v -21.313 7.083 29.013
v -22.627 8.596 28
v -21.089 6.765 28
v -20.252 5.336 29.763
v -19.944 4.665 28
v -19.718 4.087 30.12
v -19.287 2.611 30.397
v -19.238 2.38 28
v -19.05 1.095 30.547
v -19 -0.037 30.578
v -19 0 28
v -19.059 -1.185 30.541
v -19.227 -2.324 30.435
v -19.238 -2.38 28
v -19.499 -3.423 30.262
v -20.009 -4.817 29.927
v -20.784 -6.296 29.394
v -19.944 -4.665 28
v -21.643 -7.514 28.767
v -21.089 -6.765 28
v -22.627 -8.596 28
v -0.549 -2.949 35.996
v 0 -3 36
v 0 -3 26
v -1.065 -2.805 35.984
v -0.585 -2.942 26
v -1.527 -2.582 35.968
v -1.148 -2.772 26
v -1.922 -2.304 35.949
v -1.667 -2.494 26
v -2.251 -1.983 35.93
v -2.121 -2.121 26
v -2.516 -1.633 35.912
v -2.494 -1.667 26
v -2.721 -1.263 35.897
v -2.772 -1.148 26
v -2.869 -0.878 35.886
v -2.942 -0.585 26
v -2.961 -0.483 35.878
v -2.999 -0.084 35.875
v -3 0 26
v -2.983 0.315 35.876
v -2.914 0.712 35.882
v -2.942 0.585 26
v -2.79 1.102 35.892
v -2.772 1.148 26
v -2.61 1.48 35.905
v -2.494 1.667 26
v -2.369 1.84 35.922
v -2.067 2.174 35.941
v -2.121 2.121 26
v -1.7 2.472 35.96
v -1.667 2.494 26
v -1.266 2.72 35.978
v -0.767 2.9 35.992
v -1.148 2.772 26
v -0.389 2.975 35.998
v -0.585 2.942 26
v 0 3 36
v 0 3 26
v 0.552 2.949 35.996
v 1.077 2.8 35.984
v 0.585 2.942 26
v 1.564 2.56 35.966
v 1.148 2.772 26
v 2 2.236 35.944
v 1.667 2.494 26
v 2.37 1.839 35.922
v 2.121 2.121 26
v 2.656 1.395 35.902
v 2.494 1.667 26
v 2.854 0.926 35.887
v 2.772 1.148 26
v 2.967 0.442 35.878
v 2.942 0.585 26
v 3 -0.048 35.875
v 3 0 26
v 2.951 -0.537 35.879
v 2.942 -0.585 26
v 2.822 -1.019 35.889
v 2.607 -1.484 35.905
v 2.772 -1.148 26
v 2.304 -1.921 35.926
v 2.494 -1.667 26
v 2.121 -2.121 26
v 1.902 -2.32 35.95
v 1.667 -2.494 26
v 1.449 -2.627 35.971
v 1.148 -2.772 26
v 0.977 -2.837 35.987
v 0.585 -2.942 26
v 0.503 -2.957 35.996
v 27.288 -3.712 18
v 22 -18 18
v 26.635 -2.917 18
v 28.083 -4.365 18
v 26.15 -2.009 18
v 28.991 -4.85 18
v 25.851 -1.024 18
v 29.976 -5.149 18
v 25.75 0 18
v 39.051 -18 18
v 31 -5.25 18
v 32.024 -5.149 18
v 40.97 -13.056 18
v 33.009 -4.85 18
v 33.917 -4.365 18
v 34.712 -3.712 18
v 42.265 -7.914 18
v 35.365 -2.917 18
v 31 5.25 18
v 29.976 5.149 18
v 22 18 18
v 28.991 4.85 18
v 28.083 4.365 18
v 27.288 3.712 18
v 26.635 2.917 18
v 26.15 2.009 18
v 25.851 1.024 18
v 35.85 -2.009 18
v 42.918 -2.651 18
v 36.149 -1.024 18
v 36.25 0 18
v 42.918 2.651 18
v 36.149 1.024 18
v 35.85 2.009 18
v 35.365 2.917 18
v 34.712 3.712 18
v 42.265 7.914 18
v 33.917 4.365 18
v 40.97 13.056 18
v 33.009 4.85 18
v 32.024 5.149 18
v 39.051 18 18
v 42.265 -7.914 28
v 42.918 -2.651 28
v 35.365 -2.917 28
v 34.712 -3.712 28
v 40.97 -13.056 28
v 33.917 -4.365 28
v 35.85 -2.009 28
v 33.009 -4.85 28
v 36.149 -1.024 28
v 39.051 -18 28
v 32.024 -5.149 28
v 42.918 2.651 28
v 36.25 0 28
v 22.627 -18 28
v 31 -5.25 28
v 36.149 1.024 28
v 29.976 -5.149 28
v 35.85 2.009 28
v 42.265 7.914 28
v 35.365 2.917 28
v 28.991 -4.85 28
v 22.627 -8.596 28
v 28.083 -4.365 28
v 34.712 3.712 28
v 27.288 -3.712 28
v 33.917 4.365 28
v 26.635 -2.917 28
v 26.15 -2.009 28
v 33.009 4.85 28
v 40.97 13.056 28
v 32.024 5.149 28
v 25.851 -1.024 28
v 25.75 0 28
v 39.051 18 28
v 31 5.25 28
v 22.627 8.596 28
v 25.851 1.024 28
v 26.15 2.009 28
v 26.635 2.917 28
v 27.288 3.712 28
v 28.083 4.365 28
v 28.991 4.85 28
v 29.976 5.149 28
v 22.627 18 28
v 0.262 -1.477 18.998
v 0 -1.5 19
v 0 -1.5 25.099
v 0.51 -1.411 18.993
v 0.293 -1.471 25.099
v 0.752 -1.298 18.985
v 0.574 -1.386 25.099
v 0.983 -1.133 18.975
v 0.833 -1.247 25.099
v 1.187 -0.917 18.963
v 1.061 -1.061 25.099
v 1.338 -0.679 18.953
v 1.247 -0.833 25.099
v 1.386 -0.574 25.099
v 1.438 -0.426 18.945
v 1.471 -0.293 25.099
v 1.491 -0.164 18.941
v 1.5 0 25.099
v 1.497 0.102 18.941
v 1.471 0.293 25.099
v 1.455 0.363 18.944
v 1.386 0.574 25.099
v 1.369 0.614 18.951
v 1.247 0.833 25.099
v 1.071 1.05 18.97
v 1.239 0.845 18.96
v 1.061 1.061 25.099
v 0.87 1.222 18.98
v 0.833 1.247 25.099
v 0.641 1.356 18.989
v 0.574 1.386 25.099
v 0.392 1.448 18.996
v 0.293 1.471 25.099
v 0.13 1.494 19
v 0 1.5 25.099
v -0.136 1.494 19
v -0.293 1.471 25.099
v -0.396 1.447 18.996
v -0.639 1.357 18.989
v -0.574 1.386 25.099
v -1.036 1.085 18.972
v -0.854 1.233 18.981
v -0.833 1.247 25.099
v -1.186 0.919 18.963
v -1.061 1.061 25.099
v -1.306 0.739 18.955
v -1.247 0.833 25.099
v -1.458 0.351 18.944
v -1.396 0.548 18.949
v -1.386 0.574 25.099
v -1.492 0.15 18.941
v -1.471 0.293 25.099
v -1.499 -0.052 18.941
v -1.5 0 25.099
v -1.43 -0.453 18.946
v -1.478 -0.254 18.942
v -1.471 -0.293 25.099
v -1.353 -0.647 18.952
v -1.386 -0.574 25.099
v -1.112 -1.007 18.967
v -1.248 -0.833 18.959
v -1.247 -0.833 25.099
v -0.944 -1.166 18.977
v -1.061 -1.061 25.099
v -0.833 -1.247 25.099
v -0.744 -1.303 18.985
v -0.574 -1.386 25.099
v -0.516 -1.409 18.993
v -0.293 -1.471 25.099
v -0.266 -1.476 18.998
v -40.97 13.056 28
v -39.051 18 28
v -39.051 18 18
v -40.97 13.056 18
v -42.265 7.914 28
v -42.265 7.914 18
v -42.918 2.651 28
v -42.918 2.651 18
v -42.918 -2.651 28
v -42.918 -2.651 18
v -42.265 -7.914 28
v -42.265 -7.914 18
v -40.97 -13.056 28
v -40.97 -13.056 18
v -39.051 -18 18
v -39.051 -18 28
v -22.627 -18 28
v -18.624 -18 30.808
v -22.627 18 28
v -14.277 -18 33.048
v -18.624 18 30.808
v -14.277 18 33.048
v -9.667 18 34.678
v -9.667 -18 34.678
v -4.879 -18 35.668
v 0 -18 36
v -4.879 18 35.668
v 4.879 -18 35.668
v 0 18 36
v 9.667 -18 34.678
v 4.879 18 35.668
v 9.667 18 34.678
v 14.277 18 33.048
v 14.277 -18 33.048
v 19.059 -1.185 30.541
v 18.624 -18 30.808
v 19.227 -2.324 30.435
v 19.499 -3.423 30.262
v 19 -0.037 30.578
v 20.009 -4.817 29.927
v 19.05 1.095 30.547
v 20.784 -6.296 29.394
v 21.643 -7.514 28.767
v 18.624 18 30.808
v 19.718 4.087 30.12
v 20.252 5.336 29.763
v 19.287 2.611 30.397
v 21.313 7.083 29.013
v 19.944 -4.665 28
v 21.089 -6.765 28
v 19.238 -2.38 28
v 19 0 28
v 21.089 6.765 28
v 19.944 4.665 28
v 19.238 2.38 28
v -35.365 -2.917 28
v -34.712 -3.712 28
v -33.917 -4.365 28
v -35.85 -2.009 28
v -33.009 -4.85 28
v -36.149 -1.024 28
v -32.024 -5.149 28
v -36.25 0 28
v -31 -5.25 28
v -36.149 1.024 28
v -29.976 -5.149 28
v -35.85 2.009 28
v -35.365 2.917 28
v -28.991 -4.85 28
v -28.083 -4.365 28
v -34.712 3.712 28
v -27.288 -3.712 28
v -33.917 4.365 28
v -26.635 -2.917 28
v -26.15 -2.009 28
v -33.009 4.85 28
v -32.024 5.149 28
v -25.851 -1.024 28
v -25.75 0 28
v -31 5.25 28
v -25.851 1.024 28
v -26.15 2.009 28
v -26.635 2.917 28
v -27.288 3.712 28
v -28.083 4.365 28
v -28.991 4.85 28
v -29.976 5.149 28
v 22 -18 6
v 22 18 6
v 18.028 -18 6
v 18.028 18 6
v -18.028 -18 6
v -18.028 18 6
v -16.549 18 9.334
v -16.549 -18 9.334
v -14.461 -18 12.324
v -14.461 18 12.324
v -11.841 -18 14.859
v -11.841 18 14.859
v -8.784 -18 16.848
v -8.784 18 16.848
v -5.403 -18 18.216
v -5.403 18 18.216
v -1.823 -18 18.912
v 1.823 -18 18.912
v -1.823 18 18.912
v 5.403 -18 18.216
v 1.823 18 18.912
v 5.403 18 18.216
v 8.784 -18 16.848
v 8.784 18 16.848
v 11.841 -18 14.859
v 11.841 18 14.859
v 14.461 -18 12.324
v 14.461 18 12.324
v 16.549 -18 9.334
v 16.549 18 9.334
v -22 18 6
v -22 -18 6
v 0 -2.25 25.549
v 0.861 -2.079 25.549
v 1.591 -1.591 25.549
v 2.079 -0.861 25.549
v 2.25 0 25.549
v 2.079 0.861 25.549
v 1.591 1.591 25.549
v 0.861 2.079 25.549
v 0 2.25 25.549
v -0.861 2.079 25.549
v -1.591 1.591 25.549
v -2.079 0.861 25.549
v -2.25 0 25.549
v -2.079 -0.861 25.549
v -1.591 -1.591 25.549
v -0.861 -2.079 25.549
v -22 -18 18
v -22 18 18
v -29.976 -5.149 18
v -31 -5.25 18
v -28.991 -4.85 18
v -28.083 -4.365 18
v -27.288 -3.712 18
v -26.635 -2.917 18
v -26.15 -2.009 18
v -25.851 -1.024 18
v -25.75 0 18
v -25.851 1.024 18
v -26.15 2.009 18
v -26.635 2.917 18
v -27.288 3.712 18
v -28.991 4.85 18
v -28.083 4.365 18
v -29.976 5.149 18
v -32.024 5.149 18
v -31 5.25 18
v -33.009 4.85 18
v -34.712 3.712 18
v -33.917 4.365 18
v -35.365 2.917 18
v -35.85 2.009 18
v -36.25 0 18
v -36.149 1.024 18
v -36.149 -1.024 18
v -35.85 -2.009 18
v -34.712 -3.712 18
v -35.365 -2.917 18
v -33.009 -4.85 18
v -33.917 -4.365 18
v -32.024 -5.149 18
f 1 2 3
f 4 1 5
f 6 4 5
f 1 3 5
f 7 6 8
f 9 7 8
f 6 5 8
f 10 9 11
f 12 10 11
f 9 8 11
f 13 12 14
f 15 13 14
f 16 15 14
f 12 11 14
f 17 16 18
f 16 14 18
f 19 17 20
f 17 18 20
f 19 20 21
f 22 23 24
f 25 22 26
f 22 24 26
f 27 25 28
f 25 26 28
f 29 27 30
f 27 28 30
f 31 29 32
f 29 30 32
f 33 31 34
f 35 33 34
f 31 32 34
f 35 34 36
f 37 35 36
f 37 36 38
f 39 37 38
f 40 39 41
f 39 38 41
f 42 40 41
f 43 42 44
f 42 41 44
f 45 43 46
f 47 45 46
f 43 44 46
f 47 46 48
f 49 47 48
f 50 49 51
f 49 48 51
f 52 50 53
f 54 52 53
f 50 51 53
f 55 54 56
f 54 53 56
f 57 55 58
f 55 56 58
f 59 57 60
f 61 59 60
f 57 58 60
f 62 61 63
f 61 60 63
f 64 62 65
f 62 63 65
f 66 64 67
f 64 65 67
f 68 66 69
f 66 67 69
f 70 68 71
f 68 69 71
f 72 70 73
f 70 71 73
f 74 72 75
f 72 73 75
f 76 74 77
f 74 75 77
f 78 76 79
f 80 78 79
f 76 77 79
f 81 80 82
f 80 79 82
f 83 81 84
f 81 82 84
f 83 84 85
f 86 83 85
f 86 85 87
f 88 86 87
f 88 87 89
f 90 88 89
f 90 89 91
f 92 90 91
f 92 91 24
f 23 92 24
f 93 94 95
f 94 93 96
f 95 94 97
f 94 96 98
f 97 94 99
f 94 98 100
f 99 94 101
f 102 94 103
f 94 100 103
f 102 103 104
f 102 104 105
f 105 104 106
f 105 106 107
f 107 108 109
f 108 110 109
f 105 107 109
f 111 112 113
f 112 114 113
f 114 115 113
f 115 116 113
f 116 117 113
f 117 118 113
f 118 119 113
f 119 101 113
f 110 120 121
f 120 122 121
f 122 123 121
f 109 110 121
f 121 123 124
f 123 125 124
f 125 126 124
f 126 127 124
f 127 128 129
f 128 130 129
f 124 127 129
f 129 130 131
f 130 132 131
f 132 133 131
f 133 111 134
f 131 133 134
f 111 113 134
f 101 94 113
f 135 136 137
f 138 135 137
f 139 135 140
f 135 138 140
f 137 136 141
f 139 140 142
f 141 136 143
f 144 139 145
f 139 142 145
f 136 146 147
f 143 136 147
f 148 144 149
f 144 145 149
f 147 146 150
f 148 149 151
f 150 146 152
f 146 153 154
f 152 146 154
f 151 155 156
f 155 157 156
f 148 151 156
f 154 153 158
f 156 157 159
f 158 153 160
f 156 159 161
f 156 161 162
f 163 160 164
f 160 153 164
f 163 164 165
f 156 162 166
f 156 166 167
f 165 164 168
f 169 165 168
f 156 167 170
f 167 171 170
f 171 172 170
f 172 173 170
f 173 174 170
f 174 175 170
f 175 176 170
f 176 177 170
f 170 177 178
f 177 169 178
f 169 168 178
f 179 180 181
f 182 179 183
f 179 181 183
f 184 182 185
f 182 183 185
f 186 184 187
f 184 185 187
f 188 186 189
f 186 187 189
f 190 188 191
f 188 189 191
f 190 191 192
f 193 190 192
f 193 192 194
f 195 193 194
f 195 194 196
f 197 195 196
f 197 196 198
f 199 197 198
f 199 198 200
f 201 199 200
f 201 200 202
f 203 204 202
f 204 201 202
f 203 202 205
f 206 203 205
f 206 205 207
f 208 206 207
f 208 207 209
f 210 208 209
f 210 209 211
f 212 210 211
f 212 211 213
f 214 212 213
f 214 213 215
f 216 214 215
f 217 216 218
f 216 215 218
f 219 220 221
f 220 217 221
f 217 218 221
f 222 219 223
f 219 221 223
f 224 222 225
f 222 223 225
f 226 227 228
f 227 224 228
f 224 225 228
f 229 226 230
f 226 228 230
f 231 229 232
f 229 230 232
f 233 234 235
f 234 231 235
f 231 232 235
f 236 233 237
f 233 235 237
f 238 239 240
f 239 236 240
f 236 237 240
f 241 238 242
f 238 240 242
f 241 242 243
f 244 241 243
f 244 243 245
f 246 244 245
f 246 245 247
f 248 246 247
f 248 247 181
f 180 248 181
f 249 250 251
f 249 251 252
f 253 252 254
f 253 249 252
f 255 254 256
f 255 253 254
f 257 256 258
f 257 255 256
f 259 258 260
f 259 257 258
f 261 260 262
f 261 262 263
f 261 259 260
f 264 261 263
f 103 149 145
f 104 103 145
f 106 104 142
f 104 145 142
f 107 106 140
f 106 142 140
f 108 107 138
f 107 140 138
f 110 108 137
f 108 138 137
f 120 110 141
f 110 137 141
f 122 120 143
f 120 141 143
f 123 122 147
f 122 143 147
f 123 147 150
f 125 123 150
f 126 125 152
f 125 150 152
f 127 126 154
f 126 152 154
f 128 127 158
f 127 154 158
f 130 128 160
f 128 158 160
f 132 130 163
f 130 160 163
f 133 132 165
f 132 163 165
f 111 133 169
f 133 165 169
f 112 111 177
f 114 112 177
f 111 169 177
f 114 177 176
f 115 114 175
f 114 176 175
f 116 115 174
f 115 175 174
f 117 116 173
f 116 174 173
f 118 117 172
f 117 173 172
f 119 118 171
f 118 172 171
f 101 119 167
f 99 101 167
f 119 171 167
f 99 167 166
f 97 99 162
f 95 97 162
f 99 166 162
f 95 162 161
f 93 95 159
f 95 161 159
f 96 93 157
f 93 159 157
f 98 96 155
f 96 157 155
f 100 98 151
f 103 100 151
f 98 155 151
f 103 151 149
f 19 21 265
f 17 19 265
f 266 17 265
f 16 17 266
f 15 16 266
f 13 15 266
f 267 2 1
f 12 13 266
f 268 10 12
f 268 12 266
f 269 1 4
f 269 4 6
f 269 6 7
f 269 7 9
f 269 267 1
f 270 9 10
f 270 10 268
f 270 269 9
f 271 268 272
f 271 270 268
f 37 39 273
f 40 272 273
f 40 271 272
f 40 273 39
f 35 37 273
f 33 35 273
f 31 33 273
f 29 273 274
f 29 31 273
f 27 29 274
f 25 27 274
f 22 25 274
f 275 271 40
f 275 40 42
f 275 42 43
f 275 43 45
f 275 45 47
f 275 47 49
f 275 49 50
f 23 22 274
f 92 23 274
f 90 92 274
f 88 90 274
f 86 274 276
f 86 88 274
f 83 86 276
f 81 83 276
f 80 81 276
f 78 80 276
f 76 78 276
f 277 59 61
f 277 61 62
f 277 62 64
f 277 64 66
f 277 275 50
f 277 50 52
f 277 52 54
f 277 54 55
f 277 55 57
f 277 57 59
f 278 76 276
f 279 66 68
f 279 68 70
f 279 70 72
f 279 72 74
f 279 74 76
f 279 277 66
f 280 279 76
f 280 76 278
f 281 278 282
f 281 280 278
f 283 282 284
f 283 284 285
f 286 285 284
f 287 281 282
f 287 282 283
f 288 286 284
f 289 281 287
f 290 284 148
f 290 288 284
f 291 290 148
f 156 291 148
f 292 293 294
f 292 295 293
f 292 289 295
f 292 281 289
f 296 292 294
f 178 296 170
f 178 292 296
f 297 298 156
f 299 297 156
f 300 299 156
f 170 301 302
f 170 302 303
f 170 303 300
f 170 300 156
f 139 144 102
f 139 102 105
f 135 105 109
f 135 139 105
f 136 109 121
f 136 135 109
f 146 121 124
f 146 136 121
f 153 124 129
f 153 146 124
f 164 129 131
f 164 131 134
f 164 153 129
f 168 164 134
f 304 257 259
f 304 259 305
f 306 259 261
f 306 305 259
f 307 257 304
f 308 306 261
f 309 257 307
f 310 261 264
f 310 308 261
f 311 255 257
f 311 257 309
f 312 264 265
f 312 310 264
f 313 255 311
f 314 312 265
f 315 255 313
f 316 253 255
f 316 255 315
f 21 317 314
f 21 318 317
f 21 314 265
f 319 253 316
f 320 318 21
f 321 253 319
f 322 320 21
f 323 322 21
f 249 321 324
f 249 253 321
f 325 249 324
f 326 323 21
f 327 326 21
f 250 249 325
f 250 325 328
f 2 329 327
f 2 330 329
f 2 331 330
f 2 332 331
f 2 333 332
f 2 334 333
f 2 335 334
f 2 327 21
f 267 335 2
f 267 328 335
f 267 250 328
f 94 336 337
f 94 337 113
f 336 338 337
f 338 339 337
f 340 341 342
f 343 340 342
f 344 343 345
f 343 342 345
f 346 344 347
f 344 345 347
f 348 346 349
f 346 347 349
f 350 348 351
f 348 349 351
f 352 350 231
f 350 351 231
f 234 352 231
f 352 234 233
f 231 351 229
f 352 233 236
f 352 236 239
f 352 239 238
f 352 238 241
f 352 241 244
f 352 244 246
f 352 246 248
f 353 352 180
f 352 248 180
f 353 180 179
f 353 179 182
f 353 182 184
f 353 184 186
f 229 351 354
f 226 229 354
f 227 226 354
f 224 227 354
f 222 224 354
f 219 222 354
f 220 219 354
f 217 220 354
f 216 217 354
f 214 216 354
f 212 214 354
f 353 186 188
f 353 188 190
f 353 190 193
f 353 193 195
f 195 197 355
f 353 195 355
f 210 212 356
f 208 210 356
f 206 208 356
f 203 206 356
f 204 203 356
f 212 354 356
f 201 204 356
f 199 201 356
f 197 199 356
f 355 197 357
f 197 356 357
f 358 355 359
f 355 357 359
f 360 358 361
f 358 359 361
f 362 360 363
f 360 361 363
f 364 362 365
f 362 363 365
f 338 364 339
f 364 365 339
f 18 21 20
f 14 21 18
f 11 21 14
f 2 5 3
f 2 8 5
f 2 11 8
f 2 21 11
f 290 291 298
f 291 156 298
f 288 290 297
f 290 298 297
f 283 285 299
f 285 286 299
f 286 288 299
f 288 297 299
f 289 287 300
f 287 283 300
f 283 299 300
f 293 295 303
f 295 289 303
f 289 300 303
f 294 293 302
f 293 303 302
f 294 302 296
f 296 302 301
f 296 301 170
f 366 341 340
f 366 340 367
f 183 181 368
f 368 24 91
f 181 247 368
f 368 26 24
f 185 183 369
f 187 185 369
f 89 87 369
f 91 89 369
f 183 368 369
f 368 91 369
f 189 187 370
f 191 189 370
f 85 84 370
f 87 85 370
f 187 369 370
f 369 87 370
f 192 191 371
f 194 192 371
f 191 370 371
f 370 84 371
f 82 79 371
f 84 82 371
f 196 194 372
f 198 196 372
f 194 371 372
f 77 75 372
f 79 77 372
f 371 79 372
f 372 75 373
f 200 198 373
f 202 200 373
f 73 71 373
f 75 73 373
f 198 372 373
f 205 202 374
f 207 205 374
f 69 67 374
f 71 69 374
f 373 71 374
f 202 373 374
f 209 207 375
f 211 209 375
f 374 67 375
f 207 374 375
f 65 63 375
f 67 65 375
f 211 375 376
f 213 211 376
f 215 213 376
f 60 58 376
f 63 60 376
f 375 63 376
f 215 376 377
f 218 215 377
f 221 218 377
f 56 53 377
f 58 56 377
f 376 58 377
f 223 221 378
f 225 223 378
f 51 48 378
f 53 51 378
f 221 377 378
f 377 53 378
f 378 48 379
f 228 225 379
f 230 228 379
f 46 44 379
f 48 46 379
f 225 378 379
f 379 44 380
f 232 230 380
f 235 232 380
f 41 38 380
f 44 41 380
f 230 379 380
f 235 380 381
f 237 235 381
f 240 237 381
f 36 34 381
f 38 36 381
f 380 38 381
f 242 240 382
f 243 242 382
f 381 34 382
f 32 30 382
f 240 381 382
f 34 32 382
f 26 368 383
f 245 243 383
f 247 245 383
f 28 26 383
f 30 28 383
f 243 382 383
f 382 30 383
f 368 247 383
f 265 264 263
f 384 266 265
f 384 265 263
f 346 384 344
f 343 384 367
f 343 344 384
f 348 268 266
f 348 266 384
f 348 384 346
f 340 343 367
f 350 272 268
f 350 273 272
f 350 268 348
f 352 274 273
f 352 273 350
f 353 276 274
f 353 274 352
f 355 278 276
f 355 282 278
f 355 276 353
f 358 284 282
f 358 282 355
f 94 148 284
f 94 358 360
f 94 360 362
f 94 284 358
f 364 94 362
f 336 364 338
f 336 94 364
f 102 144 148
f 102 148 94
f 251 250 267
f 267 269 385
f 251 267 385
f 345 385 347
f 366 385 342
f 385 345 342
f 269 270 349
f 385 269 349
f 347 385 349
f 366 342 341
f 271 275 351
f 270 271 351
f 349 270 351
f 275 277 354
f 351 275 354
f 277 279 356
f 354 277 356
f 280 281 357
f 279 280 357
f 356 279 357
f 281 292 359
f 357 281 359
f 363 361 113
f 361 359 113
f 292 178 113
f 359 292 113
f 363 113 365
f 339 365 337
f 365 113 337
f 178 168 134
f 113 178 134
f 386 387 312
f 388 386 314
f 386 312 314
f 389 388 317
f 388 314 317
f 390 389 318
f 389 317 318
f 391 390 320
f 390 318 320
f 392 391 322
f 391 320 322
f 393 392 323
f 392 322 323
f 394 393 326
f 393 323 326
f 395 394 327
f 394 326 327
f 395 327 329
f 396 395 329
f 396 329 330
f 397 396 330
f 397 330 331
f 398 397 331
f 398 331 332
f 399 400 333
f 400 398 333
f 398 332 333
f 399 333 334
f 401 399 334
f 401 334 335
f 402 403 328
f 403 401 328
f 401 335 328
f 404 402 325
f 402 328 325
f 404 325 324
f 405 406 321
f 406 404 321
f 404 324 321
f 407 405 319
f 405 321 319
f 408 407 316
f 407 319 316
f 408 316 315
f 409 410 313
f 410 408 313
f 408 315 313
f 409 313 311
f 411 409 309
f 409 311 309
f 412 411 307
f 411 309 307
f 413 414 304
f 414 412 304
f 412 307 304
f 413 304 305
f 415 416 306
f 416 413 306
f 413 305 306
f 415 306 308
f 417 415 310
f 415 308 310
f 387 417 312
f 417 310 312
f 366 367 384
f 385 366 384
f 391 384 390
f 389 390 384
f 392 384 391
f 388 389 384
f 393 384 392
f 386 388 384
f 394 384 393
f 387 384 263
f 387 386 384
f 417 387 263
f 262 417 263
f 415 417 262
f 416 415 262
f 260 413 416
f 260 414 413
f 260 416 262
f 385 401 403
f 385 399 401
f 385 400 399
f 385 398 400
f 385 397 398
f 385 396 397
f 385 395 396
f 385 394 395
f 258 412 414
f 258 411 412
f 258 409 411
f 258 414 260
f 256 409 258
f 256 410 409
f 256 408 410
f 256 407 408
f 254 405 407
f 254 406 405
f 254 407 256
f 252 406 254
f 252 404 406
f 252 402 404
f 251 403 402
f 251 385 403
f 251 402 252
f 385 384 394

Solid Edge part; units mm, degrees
sketch "Sketch1" plane through (0, 0, 0) normal (0, -1, 0) x (1, 0, 0)
  arc A0 (0, 36) -> (-22.6274, 28) centre (0, 0) ccw
  line L0 (-43, 28) -> (-22.6274, 28)
  line L1 (-43, 18) -> (-43, 28)
  line L2 (-22, 18) -> (-43, 18)
  line L3 (-22, 6) -> (-22, 18)
  line L4 (-18.0278, 6) -> (-22, 6)
  arc A1 (0, 19) -> (-18.0278, 6) centre (0, 0) ccw
  arc A2 (0, 19) -> (18.0278, 6) centre (0, 0) cw
  line L5 (18.0278, 6) -> (22, 6)
  line L6 (22, 6) -> (22, 18)
  line L7 (22, 18) -> (43, 18)
  line L8 (43, 18) -> (43, 28)
  line L9 (43, 28) -> (22.6274, 28)
  arc A3 (0, 36) -> (22.6274, 28) centre (0, 0) cw
extrude "Protrusion1" add sketch "Sketch1" along normal mid plane 36
sketch "Sketch2" plane through (32.8137, 0, 28) normal (0, 0, 1) x (0, 1, 0)
  circle A0 centre (0, 32.8137) radius 43
  circle A1 centre (0, 32.8137) radius 50
extrude "ExtrudedCutout_1" cut sketch "Sketch2" against normal blind 61.9029
hole "Hole_1" at (31, 0, 28) direction (0, 0, -1) diameter 10.5 end up to next
sketch "Sketch3" plane through (32.8137, 0, 28) normal (0, 0, 1) x (0, 1, 0)
  circle A0 centre (0, 1.8137) radius 12
extrude "ExtrudedCutout_2" cut sketch "Sketch3" along normal blind 58.8824
mirror "Mirror1" about plane through (0, 0, 0) normal (1, 0, 0) of "Hole_1", "ExtrudedCutout_2"
hole "Hole_2" at (0, 0, 36) direction (0, 0, -1) diameter 6 depth 10 tip angle 118
hole "Hole_3" at (0, 0, 36) direction (0, 0, -1) diameter 3 end through all
